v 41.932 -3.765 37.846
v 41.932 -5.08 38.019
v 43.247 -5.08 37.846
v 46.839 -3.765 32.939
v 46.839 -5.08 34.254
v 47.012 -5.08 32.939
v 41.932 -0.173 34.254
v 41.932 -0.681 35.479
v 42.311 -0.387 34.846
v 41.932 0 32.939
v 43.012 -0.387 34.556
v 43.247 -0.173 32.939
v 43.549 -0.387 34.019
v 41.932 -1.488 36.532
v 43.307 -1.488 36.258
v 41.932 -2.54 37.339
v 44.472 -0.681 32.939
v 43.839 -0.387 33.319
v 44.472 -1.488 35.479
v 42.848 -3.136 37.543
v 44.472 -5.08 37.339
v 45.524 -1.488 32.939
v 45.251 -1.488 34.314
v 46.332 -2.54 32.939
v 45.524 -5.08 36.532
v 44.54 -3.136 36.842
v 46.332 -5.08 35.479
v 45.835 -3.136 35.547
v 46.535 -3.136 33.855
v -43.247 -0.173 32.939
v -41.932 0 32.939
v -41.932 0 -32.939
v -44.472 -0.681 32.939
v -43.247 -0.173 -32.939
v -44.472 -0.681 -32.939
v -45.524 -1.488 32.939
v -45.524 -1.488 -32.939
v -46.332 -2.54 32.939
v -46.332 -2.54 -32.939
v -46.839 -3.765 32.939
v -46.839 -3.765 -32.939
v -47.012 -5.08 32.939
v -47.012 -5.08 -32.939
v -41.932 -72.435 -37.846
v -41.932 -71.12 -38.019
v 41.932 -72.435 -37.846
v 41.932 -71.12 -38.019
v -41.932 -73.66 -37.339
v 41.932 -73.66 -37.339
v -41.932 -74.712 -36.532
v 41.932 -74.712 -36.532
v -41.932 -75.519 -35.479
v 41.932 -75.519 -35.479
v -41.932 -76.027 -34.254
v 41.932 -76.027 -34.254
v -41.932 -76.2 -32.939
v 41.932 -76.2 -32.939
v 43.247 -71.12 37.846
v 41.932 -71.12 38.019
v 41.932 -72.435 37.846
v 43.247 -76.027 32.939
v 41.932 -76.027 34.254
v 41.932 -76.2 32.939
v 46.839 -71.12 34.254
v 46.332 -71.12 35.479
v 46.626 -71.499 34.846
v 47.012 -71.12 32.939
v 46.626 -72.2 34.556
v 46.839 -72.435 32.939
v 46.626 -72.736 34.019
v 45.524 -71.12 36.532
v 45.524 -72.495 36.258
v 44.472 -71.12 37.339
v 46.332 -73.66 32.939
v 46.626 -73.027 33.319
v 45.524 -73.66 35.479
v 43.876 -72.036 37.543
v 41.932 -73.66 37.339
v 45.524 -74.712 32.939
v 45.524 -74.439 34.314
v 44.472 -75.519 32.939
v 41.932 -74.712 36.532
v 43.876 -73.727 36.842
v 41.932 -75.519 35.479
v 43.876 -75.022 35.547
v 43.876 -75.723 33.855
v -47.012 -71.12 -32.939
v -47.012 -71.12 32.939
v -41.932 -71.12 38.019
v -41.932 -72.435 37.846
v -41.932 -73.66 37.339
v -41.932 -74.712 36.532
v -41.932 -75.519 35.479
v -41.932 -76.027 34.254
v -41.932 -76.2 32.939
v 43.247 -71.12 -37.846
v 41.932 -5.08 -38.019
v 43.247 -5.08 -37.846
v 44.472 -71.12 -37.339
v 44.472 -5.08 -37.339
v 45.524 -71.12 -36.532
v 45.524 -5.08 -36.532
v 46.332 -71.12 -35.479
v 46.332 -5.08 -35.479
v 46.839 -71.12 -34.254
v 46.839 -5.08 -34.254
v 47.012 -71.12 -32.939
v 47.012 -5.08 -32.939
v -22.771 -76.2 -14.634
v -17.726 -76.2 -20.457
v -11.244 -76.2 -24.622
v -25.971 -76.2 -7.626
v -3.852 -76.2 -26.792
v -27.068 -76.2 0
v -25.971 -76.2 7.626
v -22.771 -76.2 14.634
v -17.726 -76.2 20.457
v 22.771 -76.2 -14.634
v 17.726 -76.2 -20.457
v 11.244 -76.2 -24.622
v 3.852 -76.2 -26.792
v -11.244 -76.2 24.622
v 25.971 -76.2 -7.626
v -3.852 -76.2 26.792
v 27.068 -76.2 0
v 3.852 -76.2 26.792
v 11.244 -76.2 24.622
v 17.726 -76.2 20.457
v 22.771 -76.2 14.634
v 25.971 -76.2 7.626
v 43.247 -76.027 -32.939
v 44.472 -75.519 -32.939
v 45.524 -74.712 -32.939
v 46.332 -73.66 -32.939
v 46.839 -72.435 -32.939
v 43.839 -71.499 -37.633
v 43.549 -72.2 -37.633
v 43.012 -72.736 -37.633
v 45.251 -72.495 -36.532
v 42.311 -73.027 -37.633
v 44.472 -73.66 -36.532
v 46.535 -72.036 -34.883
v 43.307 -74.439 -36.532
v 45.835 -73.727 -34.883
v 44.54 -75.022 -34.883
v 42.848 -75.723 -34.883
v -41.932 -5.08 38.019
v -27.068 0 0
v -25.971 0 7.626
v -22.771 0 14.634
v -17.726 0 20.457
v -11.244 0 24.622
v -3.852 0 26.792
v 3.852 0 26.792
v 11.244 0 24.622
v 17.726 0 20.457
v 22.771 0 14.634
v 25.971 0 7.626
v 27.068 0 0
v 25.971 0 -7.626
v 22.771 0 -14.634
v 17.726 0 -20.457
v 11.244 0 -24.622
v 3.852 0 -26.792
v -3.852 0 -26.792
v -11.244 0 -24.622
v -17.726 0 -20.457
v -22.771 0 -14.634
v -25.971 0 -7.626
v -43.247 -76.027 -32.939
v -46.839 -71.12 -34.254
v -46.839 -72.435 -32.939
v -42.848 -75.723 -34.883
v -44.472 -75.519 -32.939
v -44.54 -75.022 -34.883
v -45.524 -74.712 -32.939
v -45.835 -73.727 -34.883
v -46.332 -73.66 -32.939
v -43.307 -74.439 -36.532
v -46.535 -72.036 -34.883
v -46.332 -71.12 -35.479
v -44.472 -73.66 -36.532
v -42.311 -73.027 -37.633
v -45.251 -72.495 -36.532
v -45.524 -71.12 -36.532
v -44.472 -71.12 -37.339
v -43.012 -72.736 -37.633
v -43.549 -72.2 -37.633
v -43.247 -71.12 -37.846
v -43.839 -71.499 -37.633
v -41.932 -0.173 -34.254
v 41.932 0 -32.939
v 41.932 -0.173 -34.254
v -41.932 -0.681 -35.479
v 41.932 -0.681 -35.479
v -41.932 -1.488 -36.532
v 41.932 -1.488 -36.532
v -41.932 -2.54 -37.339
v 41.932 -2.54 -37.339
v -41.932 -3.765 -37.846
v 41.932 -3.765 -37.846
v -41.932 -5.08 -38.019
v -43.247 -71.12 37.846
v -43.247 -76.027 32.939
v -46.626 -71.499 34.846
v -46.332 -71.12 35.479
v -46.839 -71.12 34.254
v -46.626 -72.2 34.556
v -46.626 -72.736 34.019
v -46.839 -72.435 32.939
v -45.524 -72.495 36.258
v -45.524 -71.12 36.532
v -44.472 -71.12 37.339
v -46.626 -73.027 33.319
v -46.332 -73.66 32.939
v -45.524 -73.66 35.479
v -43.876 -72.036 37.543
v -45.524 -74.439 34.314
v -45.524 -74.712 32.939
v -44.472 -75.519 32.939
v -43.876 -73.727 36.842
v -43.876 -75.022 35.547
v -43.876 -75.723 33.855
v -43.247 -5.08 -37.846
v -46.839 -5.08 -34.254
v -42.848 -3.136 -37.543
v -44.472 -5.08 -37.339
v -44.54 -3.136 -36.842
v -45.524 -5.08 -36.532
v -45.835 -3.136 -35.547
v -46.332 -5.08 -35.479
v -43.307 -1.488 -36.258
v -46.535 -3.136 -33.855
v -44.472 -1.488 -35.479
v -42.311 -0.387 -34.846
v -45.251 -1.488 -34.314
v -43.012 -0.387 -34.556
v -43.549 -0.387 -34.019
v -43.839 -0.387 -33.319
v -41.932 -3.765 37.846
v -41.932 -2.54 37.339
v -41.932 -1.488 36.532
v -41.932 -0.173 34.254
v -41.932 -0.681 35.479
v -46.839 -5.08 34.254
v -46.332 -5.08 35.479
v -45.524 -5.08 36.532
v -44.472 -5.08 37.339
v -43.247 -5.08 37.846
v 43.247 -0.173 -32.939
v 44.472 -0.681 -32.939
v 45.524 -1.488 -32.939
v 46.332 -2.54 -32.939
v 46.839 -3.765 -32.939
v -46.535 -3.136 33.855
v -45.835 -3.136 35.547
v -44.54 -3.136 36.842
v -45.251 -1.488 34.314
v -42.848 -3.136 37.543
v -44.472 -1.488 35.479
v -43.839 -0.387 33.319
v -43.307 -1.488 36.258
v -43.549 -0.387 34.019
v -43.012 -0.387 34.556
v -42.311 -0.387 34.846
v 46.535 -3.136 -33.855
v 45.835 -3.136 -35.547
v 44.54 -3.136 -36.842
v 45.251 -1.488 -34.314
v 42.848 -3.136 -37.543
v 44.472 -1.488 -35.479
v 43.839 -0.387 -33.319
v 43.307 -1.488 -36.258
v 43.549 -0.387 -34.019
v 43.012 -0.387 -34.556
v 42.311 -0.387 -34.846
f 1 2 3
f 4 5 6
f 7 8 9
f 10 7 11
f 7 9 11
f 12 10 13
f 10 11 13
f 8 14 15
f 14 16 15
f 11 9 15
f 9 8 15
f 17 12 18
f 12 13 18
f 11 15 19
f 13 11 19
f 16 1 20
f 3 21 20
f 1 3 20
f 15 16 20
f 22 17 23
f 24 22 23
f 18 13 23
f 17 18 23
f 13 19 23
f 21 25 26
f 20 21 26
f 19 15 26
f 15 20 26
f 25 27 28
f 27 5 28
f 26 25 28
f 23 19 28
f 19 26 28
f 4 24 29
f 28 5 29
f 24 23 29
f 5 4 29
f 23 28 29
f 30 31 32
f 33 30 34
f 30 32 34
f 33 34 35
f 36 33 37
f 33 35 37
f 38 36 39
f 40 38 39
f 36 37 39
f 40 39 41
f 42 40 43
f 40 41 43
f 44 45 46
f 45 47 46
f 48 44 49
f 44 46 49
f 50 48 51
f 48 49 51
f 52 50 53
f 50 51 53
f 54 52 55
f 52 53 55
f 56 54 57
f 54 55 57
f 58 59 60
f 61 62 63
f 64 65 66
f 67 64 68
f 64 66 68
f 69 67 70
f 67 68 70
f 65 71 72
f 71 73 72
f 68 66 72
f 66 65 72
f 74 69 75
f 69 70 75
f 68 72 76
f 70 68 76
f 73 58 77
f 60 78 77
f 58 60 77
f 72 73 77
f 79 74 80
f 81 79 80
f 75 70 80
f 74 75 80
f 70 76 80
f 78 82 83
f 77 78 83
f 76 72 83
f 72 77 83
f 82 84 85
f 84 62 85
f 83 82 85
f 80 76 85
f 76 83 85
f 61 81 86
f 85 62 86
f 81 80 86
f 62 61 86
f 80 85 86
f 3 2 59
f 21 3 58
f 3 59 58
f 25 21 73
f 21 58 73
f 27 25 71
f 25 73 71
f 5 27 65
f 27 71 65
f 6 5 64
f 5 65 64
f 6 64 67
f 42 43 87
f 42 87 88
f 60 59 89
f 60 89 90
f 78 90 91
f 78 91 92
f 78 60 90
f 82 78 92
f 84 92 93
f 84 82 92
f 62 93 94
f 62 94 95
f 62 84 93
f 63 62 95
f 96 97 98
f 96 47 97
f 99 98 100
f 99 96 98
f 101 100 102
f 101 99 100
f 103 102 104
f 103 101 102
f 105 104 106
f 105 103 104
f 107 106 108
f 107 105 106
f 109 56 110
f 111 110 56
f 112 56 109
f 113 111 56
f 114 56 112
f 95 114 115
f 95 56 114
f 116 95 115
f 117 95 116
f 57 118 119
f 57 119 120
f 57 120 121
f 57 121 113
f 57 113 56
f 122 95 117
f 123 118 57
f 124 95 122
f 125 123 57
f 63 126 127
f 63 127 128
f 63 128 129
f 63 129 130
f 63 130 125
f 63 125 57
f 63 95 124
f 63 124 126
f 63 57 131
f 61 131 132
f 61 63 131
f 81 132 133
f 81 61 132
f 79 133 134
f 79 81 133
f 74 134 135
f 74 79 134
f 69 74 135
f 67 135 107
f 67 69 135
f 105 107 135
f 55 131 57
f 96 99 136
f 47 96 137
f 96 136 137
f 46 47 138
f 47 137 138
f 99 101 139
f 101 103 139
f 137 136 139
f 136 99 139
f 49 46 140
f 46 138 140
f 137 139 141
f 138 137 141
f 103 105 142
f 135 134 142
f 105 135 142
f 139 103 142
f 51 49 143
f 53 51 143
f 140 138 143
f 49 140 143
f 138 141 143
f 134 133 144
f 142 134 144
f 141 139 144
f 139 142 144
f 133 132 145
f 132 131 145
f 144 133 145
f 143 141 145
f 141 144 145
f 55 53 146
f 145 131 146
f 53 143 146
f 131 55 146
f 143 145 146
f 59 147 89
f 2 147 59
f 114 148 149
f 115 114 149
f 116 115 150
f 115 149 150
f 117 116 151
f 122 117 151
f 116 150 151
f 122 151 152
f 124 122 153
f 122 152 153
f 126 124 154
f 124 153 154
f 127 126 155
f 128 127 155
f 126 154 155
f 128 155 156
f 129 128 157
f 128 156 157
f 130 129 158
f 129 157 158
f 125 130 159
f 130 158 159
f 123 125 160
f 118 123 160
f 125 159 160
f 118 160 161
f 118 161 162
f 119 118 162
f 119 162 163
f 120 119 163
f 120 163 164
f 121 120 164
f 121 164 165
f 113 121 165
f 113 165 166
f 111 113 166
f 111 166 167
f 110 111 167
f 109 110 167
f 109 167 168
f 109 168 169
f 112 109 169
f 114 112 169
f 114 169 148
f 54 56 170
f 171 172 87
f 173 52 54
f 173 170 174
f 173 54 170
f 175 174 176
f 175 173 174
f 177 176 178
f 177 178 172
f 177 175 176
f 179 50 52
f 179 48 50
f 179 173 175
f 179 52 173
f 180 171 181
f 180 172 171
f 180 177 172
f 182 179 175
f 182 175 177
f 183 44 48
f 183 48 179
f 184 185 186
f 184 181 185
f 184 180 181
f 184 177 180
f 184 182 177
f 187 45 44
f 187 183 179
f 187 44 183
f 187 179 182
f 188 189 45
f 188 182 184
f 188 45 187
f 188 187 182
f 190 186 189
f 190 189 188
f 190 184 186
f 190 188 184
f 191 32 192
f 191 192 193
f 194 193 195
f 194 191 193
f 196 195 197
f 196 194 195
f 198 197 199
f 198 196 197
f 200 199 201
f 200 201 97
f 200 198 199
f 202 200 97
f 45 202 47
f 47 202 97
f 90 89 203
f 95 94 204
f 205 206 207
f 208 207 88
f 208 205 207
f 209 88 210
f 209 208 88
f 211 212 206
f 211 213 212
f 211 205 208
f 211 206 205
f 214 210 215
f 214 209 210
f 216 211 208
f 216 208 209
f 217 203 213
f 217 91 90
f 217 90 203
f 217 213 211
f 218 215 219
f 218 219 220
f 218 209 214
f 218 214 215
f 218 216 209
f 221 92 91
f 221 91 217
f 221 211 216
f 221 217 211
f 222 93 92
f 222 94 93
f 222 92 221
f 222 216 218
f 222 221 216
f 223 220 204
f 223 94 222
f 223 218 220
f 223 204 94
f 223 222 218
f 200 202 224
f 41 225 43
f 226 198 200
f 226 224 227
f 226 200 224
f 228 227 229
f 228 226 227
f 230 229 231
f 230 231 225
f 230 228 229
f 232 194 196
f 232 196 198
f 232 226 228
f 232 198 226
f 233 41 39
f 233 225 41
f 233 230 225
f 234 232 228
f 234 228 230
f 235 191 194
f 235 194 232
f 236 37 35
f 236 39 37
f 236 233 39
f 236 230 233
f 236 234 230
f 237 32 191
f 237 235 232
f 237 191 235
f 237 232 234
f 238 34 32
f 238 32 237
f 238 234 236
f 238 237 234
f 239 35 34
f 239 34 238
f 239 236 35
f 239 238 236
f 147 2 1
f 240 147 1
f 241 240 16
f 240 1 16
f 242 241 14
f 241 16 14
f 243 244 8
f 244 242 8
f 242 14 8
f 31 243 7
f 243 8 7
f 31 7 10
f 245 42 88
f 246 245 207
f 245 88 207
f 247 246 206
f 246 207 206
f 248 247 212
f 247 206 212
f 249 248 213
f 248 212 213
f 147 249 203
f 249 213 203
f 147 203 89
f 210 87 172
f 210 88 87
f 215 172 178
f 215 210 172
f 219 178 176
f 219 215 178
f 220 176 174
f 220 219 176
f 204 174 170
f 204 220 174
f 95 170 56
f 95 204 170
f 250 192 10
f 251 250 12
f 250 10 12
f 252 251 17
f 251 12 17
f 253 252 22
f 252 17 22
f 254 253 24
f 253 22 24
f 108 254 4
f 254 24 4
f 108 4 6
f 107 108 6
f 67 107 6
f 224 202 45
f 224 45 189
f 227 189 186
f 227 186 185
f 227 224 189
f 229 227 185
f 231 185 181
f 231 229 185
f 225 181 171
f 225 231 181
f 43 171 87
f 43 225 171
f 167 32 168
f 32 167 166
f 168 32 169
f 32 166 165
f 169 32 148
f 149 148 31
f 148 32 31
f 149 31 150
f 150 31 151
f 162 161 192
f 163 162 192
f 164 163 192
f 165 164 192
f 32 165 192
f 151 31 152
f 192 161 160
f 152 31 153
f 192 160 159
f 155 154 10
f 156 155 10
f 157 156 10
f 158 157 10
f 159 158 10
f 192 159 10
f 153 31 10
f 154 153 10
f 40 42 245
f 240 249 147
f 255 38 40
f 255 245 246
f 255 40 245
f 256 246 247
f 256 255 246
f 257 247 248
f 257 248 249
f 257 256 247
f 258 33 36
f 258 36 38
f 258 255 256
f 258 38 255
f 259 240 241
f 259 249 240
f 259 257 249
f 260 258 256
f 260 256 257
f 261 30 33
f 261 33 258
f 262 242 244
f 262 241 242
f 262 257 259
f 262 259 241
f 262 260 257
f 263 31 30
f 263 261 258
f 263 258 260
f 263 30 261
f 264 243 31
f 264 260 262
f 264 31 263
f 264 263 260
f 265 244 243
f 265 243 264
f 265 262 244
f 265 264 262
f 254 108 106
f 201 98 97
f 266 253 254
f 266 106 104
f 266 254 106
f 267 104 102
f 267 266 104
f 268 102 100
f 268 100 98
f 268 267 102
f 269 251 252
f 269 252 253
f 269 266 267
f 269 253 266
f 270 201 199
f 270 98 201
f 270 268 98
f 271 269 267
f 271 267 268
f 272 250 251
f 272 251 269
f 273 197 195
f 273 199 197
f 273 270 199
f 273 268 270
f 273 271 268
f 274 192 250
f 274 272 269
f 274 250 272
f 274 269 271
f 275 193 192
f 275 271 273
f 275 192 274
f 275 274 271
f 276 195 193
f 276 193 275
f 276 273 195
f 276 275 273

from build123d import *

# Parameters (mm, degrees)
F0_W         = 94.0244570374
F0_H         = 76.03880018
F1_DEPTH     = 76.2
F2_R         = 27.0679011962
F3_DEPTH     = 101.6
F4_R         = 5.08
F5_T1_DEPTH  = 83.8644570374
F5_T3_DEPTH  = 65.87880018
F5_T5_DEPTH  = 66.04
F5_S9_W      = 5.08
F5_S9_H      = 5.08
F5_T10_DEPTH = 5.08
F5_S15_W     = 5.08
F5_S15_H     = 5.08
F5_T16_DEPTH = 5.08
F5_S21_W     = 5.08
F5_S21_H     = 5.08
F5_T22_DEPTH = 5.08
F5_S27_W     = 5.08
F5_S27_H     = 5.08
F5_T28_DEPTH = 5.08


# Not quite as in the source:
# - a fillet or chamfer that OpenCascade refuses, or shapes differently, is made with other operations: its cross-section is extruded or revolved along the edge and cut away or added


with BuildPart() as f1:
    # F0 (on Front) → F1 (new body)
    with BuildSketch(Plane.XZ):
        Rectangle(F0_W, F0_H)
    extrude(amount=F1_DEPTH)

    # F2 (on face) → F3 (cut)
    with BuildSketch(Plane(origin=(0, 0, 0), x_dir=(-1, 0, 0), z_dir=(0, 1, 0))):
        Circle(F2_R)
    extrude(amount=-F3_DEPTH, mode=Mode.SUBTRACT)

    # F4
    f4_edges = [f1.edges().sort_by_distance(p)[0] for p in [
        (0, -76.2, 38.0194),
        (47.012229, -38.1, 38.0194),
        (0, 0, 38.0194),
        (-47.012229, -38.1, 38.0194),
        (47.012229, -76.2, 0),
        (47.012229, 0, 0),
        (47.012229, -38.1, -38.0194),
        (0, -76.2, -38.0194),
        (-47.012229, -76.2, 0),
    ]]
    fillet(f4_edges, radius=F4_R)

    # F5: fillet of radius 5.08 on 3 edges, made by hand

    # F5_s2 → F5_t1 (cut)
    with BuildSketch(Plane.YZ.offset(-41.9322285187)):
        with BuildLine():
            ThreePointArc((0, -32.93940009), (-1.4878975516, -36.5315025384), (-5.08, -38.01940009))
            Line((-5.08, -38.01940009), (0, -38.01940009))
            Line((0, -38.01940009), (0, -32.93940009))
        make_face()
    extrude(amount=F5_T1_DEPTH, mode=Mode.SUBTRACT)

    # F5_s4 → F5_t3 (cut)
    with BuildSketch(Plane.XY.offset(-32.93940009)):
        with BuildLine():
            ThreePointArc((-41.9322285187, 0), (-45.5243309672, -1.4878975516), (-47.0122285187, -5.08))
            Line((-47.0122285187, -5.08), (-47.0122285187, 0))
            Line((-47.0122285187, 0), (-41.9322285187, 0))
        make_face()
    extrude(amount=F5_T3_DEPTH, mode=Mode.SUBTRACT)

    # F5_s6 → F5_t5 (cut)
    with BuildSketch(Plane.XZ.offset(5.08)):
        with BuildLine():
            ThreePointArc((-41.9322285187, -38.01940009), (-45.5243309672, -36.5315025384), (-47.0122285187, -32.93940009))
            Line((-47.0122285187, -32.93940009), (-47.0122285187, -38.01940009))
            Line((-47.0122285187, -38.01940009), (-41.9322285187, -38.01940009))
        make_face()
    extrude(amount=F5_T5_DEPTH, mode=Mode.SUBTRACT)


with BuildPart() as f5_tool8:
    # F5_s9 → F5_t10 (new body)
    with BuildSketch(Plane.XY.offset(-32.93940009)):
        with Locations((-44.4722285187, -73.66)):
            Rectangle(F5_S9_W, F5_S9_H)
    extrude(amount=-F5_T10_DEPTH)

    # F5_s11 → F5_t12 (revolve, cut)
    with BuildSketch(Plane(origin=(-41.9322285187, -71.12, -32.93940009), x_dir=(0.7071067812, 0.7071067812, 0), z_dir=(-0.7071067812, 0.7071067812, 0))):
        with BuildLine():
            ThreePointArc((0, -5.08), (5.08, 0), (0, 5.08))
            Line((0, 5.08), (0, -5.08))
        make_face()
    revolve(axis=Axis((-41.9322285187, -71.12, -32.93940009), (0, 0, -1)), mode=Mode.SUBTRACT)


with BuildPart() as f1_1:
    add(f1.part)

    # F5_t7: cut F5_tool8
    add(f5_tool8.part, mode=Mode.SUBTRACT)


with BuildPart() as f5_tool14:
    # F5_s15 → F5_t16 (new body)
    with BuildSketch(Plane.XZ.offset(5.08)):
        with Locations((-44.4722285187, 35.47940009)):
            Rectangle(F5_S15_W, F5_S15_H)
    extrude(amount=-F5_T16_DEPTH)

    # F5_s17 → F5_t18 (revolve, cut)
    with BuildSketch(Plane(origin=(-41.9322285187, -5.08, 32.93940009), x_dir=(0.7071067812, 0, -0.7071067812), z_dir=(0.7071067812, 0, 0.7071067812))):
        with BuildLine():
            ThreePointArc((0, -5.08), (5.08, 0), (0, 5.08))
            Line((0, 5.08), (0, -5.08))
        make_face()
    revolve(axis=Axis((-41.9322285187, -5.08, 32.93940009), (0, 1, 0)), mode=Mode.SUBTRACT)


with BuildPart() as f1_2:
    add(f1_1.part)

    # F5_t13: cut F5_tool14
    add(f5_tool14.part, mode=Mode.SUBTRACT)


with BuildPart() as f5_tool20:
    # F5_s21 → F5_t22 (new body)
    with BuildSketch(Plane.XZ.offset(5.08)):
        with Locations((44.4722285187, -35.47940009)):
            Rectangle(F5_S21_W, F5_S21_H)
    extrude(amount=-F5_T22_DEPTH)

    # F5_s23 → F5_t24 (revolve, cut)
    with BuildSketch(Plane(origin=(41.9322285187, -5.08, -32.93940009), x_dir=(-0.7071067812, 0, 0.7071067812), z_dir=(-0.7071067812, 0, -0.7071067812))):
        with BuildLine():
            ThreePointArc((0, -5.08), (5.08, 0), (0, 5.08))
            Line((0, 5.08), (0, -5.08))
        make_face()
    revolve(axis=Axis((41.9322285187, -5.08, -32.93940009), (0, 1, 0)), mode=Mode.SUBTRACT)


with BuildPart() as f1_3:
    add(f1_2.part)

    # F5_t19: cut F5_tool20
    add(f5_tool20.part, mode=Mode.SUBTRACT)


with BuildPart() as f5_tool26:
    # F5_s27 → F5_t28 (new body)
    with BuildSketch(Plane.XZ.offset(5.08)):
        with Locations((-44.4722285187, -35.47940009)):
            Rectangle(F5_S27_W, F5_S27_H)
    extrude(amount=-F5_T28_DEPTH)

    # F5_s29 → F5_t30 (revolve, cut)
    with BuildSketch(Plane(origin=(-41.9322285187, -5.08, -32.93940009), x_dir=(0.7071067812, 0, 0.7071067812), z_dir=(-0.7071067812, 0, 0.7071067812))):
        with BuildLine():
            ThreePointArc((0, -5.08), (5.08, 0), (0, 5.08))
            Line((0, 5.08), (0, -5.08))
        make_face()
    revolve(axis=Axis((-41.9322285187, -5.08, -32.93940009), (0, 1, 0)), mode=Mode.SUBTRACT)


with BuildPart() as f1_4:
    add(f1_3.part)

    # F5_t25: cut F5_tool26
    add(f5_tool26.part, mode=Mode.SUBTRACT)


solid = f1_4.part
